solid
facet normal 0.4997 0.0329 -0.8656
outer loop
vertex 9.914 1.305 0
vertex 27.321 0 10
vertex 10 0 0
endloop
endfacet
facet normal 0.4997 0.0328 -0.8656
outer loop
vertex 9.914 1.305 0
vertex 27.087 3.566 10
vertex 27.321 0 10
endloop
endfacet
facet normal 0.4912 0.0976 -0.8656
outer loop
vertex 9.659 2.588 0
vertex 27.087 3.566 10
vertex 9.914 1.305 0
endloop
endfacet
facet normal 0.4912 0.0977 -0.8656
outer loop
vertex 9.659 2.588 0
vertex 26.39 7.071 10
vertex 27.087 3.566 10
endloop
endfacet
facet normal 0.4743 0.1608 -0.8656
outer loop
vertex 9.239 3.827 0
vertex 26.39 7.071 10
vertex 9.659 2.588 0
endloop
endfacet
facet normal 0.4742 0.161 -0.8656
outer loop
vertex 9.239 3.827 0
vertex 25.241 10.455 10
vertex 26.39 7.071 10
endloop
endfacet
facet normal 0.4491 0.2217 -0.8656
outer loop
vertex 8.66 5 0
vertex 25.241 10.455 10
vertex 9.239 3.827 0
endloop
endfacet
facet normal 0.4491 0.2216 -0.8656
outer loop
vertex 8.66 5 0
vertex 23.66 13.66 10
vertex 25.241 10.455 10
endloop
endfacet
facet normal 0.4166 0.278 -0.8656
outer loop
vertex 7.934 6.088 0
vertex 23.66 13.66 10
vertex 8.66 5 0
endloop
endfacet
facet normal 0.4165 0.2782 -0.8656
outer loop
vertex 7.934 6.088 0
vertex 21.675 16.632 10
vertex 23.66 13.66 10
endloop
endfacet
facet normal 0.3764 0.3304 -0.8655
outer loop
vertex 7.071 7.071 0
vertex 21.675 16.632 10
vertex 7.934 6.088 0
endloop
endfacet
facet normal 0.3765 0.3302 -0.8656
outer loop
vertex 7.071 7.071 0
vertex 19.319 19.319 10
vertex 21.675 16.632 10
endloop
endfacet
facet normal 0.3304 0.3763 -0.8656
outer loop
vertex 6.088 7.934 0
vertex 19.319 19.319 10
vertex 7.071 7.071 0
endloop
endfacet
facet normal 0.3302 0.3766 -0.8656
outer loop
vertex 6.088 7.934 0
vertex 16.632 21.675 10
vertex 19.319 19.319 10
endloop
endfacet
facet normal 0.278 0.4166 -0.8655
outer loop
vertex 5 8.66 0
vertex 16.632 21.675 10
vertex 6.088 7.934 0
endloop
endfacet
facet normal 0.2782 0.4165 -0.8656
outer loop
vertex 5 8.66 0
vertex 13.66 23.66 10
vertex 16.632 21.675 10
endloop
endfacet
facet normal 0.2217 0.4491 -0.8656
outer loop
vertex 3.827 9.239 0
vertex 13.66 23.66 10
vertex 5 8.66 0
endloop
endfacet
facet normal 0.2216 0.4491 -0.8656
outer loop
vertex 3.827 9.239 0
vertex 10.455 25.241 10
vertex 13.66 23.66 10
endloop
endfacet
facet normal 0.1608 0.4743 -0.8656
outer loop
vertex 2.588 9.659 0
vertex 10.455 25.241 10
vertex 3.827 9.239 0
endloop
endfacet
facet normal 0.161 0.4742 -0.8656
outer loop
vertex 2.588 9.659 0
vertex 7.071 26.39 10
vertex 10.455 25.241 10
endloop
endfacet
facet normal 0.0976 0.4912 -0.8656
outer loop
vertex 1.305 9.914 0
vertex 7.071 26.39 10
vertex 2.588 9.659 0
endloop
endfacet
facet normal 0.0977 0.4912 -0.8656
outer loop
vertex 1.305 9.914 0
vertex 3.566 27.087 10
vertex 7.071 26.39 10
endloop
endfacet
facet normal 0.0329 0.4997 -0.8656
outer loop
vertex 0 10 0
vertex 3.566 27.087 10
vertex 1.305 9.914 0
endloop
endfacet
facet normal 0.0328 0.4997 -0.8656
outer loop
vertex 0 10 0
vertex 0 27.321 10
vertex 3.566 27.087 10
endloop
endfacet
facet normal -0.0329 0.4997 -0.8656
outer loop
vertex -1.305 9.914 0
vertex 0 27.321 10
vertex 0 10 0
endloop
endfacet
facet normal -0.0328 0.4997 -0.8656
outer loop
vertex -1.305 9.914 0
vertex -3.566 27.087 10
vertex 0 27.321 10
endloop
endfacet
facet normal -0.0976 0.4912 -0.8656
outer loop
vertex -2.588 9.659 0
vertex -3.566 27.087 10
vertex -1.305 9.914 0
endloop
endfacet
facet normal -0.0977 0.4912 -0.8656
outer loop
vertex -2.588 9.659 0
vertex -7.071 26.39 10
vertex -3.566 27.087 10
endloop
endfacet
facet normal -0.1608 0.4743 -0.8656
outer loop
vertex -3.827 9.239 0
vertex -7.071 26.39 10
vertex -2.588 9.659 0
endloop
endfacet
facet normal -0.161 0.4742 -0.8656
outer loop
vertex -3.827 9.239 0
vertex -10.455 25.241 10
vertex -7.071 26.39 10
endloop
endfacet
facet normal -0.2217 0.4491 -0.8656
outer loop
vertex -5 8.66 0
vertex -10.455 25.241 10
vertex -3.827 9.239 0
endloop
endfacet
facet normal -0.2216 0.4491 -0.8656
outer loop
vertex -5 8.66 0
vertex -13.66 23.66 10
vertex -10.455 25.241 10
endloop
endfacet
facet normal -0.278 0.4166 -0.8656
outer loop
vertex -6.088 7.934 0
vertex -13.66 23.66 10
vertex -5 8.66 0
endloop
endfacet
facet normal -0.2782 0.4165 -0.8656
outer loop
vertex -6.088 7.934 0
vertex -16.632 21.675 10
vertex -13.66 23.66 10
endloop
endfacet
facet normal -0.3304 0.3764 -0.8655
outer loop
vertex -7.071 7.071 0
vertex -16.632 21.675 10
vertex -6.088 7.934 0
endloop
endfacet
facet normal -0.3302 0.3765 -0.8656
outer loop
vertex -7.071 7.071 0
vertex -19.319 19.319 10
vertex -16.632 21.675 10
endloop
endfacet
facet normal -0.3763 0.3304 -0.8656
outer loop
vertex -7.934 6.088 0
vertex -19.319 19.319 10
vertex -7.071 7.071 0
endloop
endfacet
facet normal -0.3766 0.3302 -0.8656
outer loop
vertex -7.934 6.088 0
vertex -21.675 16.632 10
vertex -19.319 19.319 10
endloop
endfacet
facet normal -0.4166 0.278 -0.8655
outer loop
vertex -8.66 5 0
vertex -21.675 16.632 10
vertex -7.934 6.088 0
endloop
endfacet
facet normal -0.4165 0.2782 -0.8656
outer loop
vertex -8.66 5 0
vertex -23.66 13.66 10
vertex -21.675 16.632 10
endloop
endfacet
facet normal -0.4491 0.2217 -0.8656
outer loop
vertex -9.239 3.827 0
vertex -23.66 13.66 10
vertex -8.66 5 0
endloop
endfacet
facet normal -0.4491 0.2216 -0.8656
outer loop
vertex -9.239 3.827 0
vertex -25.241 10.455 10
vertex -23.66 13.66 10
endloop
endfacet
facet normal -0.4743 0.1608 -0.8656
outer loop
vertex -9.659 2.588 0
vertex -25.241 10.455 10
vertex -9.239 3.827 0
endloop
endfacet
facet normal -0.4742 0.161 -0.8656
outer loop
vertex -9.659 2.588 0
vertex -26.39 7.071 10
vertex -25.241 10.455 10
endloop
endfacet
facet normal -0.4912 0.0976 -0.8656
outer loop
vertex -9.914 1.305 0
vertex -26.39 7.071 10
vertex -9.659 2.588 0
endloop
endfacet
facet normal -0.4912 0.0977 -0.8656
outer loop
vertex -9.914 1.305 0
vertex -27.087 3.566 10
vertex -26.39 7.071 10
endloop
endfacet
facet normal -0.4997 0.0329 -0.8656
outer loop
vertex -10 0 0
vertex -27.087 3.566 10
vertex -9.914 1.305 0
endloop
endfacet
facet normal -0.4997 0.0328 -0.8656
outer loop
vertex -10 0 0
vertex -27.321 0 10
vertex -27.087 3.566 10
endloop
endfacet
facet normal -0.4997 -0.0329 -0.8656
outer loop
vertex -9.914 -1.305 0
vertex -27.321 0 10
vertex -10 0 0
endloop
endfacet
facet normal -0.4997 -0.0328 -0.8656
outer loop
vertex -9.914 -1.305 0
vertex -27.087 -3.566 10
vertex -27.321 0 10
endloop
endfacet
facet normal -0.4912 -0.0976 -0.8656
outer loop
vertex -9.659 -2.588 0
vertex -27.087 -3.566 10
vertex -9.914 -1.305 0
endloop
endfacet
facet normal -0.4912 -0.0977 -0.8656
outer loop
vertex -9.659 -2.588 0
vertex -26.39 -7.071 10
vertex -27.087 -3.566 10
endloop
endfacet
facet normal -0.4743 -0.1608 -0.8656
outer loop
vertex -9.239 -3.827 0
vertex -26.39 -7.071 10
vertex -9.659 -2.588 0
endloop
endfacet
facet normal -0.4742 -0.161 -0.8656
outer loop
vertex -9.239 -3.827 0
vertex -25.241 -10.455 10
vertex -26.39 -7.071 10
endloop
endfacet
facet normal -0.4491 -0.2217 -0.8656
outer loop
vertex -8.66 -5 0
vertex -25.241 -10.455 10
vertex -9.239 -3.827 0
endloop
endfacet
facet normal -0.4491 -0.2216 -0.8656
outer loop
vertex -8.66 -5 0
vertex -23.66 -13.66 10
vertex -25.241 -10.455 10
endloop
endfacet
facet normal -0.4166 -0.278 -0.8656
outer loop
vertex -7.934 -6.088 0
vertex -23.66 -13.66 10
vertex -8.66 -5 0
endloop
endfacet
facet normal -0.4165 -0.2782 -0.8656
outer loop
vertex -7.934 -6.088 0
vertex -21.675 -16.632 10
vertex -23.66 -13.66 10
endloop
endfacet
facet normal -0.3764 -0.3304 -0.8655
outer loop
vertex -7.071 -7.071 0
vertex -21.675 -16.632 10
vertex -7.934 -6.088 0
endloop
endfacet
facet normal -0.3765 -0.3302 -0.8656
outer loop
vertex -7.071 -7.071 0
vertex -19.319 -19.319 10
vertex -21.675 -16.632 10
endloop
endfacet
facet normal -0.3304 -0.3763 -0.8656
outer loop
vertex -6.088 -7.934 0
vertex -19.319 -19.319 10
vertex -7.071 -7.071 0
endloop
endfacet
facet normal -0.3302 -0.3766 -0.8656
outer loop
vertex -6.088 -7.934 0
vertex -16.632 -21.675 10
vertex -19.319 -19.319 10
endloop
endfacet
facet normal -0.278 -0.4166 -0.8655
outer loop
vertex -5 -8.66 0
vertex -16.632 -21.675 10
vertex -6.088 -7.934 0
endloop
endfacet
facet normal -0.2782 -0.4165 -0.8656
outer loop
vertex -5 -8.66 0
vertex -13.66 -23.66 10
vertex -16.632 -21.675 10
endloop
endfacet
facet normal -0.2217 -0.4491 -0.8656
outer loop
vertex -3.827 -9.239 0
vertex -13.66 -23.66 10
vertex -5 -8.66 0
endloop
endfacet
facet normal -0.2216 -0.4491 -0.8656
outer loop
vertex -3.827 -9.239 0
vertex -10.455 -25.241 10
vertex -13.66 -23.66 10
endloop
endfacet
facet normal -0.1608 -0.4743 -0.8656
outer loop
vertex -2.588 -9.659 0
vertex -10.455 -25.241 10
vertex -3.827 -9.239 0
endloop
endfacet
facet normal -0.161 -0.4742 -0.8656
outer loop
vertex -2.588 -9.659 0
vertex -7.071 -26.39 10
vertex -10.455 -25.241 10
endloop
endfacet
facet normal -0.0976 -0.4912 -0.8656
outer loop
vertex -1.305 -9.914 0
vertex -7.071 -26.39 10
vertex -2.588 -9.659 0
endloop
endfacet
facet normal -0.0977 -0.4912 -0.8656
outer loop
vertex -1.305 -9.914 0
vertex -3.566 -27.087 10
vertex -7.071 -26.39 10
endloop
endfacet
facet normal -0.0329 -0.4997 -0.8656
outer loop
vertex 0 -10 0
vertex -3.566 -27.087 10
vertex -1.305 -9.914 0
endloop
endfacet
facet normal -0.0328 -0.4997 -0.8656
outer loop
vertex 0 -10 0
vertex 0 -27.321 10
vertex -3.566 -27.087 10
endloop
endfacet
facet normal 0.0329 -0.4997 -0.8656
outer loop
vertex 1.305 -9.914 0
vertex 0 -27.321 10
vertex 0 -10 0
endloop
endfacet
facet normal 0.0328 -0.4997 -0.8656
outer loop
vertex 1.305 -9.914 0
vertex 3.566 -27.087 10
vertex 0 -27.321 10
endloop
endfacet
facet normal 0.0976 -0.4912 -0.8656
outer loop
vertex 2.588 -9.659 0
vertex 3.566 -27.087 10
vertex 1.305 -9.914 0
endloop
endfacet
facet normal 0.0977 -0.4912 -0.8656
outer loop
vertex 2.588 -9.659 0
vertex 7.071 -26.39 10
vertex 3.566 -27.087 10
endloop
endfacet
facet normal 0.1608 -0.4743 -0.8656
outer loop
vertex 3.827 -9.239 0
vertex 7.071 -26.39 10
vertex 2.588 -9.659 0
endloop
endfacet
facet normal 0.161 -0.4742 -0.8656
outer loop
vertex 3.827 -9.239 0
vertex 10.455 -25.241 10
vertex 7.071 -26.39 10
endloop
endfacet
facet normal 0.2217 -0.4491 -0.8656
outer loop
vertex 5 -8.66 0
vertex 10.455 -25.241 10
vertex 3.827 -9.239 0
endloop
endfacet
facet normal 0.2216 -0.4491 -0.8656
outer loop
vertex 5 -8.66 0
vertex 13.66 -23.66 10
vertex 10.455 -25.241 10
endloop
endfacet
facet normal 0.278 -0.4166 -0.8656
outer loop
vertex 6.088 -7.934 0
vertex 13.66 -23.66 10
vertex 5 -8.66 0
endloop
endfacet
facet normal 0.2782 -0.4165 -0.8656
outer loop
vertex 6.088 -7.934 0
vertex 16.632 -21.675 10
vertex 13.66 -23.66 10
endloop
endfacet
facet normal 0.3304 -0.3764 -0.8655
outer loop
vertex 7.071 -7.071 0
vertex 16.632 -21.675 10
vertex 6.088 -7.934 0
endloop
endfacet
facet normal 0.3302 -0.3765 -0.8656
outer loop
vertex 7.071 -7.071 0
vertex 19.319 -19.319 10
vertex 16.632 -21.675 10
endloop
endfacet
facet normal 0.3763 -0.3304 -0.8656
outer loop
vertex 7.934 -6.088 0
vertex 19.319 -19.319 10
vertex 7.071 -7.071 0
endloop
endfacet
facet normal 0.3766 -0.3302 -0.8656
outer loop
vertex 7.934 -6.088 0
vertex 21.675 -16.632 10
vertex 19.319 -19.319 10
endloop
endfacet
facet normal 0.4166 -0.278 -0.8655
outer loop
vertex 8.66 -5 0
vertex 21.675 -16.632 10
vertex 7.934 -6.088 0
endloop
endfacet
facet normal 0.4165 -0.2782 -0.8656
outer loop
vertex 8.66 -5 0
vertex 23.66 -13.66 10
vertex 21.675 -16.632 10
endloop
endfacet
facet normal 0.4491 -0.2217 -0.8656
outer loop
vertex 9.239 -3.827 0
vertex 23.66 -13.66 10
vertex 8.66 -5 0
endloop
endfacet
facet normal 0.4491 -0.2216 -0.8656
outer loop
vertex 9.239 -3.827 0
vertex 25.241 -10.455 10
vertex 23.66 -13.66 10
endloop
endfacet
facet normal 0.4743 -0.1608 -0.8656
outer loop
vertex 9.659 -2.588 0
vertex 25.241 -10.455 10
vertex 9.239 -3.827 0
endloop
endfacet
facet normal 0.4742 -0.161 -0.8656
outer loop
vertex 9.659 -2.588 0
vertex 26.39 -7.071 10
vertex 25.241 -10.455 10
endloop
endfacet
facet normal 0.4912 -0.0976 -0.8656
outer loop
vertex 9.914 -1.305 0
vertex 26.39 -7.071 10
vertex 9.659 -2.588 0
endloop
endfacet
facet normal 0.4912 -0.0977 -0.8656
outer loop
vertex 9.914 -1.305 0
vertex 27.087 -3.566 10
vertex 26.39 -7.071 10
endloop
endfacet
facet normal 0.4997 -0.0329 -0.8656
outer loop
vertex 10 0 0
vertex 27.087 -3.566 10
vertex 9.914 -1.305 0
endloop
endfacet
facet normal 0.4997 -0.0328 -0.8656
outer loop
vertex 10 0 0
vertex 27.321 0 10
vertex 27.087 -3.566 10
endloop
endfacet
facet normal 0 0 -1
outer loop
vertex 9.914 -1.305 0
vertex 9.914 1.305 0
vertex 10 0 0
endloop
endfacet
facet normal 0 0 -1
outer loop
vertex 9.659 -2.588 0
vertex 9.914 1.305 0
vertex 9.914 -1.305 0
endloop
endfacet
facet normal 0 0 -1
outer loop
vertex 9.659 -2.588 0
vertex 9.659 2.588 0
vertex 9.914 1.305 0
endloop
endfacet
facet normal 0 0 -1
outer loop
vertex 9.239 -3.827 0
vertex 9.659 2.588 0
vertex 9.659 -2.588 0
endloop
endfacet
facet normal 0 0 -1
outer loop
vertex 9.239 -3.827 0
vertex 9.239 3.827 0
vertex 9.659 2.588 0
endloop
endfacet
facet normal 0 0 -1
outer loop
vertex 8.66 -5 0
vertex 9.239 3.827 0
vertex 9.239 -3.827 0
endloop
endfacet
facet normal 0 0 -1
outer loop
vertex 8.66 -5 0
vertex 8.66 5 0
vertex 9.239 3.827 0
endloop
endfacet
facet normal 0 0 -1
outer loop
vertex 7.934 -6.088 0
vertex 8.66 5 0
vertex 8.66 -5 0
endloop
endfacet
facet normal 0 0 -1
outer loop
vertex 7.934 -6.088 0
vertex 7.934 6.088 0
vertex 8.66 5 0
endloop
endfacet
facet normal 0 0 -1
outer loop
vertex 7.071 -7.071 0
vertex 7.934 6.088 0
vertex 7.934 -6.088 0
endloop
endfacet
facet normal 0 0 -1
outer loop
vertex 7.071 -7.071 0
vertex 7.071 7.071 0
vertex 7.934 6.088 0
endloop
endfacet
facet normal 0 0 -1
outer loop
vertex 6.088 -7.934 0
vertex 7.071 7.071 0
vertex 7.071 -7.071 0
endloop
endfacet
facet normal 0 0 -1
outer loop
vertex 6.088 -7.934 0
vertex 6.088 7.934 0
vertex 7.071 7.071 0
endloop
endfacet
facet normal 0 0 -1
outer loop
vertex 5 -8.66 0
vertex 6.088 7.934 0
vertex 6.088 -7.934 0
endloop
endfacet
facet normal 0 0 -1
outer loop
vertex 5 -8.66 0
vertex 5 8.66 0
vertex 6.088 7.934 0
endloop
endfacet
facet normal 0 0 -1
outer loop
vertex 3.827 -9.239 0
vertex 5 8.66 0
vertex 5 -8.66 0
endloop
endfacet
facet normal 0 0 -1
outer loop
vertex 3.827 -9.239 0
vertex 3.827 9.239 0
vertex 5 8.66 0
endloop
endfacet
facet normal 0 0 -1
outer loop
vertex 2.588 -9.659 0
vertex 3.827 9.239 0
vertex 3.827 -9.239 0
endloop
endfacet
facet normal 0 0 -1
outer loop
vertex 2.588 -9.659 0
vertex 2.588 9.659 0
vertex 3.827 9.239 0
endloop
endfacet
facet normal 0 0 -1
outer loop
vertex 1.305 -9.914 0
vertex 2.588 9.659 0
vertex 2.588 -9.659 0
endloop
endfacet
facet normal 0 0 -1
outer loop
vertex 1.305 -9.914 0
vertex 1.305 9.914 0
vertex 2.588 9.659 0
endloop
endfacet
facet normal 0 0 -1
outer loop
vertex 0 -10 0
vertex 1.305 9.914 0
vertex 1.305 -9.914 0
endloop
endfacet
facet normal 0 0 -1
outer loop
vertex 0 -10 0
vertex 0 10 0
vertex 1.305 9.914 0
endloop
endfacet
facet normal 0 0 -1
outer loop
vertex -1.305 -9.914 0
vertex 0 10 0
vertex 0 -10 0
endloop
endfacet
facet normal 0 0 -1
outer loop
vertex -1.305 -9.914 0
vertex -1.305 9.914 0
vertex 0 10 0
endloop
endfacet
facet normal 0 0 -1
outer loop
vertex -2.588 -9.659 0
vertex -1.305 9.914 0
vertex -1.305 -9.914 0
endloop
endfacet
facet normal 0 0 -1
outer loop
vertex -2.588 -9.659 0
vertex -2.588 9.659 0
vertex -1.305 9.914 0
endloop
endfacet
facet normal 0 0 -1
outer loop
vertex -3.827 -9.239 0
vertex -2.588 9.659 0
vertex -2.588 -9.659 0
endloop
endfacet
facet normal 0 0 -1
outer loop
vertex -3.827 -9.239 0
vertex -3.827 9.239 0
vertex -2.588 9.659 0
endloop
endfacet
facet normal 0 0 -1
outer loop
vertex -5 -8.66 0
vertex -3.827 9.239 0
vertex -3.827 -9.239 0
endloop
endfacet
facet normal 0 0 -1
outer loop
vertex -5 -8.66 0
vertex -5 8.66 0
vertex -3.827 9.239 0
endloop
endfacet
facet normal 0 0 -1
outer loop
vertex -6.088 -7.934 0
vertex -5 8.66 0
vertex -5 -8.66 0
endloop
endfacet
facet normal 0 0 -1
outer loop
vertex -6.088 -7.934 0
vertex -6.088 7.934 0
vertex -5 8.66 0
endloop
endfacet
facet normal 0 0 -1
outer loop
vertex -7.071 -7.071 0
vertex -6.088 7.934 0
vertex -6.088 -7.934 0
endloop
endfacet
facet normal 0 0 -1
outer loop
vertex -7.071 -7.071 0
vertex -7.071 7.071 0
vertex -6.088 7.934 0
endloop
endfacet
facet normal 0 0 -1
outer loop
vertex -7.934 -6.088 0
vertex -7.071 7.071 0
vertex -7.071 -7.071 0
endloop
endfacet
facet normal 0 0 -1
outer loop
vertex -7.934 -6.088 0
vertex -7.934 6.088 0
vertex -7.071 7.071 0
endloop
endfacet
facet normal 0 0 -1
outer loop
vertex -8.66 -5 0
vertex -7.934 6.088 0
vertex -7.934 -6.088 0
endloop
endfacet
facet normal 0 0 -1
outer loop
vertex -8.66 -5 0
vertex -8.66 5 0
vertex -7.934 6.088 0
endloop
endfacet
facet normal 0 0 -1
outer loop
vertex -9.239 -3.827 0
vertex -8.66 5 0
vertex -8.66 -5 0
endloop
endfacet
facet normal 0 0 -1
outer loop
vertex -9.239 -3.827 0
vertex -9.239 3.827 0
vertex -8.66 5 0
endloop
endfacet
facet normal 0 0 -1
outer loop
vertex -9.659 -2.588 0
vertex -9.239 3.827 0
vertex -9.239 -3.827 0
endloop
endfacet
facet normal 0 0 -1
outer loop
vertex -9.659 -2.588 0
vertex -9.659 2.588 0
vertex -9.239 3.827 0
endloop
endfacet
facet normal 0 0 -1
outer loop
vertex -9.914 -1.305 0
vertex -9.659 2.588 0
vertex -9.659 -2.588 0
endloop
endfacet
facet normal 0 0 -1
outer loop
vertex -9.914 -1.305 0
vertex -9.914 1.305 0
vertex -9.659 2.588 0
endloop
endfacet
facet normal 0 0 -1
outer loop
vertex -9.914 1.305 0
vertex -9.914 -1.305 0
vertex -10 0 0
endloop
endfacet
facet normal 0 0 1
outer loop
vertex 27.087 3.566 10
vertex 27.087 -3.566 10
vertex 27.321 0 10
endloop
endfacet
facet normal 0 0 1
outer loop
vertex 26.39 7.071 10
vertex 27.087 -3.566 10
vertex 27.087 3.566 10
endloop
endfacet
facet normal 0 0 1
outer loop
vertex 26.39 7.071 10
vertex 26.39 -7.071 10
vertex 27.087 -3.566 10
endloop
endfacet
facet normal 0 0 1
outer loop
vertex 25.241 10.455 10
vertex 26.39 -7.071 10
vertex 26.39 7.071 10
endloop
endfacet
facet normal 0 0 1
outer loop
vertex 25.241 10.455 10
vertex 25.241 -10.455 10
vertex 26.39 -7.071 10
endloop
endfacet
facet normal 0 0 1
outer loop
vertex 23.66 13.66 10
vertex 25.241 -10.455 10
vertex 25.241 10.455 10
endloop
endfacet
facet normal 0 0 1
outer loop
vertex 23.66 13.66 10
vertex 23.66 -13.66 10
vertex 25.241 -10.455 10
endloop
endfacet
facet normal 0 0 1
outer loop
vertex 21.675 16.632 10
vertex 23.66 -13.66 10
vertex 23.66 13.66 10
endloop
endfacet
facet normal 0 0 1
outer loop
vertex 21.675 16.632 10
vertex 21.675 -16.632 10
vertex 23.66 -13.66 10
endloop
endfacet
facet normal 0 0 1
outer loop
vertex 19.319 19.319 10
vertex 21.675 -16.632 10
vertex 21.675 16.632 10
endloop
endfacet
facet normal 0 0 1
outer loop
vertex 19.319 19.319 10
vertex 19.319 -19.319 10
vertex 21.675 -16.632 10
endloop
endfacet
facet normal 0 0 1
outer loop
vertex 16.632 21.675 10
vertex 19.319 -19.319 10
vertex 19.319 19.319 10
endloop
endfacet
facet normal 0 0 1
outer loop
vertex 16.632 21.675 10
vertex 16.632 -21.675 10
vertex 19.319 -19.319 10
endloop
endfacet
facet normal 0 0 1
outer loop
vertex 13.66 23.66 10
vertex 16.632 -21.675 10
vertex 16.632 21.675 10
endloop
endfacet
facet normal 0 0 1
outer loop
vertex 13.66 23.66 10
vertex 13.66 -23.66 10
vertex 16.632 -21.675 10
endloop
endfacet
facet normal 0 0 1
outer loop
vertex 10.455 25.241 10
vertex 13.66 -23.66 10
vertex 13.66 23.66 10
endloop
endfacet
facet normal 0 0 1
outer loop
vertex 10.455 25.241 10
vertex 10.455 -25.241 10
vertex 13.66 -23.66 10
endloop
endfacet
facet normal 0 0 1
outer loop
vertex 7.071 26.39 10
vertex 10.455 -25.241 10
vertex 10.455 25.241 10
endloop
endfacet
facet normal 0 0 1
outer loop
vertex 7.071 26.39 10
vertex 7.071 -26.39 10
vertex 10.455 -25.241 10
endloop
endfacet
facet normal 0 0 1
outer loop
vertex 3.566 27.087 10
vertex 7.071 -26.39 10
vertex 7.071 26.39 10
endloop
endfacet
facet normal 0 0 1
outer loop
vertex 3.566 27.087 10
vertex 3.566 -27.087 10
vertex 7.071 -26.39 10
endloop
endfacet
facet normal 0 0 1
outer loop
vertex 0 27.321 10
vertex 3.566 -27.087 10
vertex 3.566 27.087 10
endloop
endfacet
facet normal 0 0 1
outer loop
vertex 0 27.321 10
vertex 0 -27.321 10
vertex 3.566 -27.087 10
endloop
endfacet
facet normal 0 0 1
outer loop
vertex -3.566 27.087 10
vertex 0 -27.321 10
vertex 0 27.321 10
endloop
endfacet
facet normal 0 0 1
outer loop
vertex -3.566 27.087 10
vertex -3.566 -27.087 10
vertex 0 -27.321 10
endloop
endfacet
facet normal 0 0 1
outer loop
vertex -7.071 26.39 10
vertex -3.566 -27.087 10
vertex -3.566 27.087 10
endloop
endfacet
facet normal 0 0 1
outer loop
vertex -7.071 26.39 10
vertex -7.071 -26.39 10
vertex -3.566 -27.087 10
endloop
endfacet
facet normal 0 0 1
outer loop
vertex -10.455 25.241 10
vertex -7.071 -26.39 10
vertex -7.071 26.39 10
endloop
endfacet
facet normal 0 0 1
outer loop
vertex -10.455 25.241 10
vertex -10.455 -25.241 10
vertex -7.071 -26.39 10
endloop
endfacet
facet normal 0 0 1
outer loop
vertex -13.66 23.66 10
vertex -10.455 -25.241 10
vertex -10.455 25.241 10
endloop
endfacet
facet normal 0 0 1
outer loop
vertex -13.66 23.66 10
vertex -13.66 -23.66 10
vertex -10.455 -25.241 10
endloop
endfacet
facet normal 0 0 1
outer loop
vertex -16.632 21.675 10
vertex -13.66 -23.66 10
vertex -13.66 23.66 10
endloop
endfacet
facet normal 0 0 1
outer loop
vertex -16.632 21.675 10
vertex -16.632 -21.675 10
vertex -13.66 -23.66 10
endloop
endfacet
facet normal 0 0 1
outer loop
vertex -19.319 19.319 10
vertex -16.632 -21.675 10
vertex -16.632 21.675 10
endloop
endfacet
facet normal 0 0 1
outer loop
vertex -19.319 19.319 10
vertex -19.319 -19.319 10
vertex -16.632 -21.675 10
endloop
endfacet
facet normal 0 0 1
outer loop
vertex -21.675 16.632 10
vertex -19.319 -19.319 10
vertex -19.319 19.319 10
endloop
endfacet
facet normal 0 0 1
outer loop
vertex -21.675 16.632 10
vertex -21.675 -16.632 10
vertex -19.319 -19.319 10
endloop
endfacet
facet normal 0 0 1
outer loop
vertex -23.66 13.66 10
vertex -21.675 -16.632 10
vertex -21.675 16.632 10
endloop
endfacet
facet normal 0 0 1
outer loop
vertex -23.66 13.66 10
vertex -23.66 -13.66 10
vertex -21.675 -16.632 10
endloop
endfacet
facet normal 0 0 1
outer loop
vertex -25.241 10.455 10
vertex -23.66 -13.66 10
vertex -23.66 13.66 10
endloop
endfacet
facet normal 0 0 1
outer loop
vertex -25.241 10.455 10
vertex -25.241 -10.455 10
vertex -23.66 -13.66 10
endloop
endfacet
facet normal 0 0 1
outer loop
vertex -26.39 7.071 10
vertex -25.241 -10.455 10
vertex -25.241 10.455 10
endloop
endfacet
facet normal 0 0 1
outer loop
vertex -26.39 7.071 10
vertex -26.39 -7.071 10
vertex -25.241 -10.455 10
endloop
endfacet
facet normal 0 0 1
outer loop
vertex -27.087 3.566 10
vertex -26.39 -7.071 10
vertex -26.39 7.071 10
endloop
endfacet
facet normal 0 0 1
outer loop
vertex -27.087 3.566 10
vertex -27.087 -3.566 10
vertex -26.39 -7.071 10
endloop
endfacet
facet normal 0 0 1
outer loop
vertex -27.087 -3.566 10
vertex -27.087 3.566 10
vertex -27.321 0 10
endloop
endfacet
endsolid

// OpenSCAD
// ~60 deg from vertical (r grows 17.3 over 10): a real overhang region far past 45.
$fn = 48;
cylinder(h = 10, r1 = 10, r2 = 10 + 10 * tan(60));
